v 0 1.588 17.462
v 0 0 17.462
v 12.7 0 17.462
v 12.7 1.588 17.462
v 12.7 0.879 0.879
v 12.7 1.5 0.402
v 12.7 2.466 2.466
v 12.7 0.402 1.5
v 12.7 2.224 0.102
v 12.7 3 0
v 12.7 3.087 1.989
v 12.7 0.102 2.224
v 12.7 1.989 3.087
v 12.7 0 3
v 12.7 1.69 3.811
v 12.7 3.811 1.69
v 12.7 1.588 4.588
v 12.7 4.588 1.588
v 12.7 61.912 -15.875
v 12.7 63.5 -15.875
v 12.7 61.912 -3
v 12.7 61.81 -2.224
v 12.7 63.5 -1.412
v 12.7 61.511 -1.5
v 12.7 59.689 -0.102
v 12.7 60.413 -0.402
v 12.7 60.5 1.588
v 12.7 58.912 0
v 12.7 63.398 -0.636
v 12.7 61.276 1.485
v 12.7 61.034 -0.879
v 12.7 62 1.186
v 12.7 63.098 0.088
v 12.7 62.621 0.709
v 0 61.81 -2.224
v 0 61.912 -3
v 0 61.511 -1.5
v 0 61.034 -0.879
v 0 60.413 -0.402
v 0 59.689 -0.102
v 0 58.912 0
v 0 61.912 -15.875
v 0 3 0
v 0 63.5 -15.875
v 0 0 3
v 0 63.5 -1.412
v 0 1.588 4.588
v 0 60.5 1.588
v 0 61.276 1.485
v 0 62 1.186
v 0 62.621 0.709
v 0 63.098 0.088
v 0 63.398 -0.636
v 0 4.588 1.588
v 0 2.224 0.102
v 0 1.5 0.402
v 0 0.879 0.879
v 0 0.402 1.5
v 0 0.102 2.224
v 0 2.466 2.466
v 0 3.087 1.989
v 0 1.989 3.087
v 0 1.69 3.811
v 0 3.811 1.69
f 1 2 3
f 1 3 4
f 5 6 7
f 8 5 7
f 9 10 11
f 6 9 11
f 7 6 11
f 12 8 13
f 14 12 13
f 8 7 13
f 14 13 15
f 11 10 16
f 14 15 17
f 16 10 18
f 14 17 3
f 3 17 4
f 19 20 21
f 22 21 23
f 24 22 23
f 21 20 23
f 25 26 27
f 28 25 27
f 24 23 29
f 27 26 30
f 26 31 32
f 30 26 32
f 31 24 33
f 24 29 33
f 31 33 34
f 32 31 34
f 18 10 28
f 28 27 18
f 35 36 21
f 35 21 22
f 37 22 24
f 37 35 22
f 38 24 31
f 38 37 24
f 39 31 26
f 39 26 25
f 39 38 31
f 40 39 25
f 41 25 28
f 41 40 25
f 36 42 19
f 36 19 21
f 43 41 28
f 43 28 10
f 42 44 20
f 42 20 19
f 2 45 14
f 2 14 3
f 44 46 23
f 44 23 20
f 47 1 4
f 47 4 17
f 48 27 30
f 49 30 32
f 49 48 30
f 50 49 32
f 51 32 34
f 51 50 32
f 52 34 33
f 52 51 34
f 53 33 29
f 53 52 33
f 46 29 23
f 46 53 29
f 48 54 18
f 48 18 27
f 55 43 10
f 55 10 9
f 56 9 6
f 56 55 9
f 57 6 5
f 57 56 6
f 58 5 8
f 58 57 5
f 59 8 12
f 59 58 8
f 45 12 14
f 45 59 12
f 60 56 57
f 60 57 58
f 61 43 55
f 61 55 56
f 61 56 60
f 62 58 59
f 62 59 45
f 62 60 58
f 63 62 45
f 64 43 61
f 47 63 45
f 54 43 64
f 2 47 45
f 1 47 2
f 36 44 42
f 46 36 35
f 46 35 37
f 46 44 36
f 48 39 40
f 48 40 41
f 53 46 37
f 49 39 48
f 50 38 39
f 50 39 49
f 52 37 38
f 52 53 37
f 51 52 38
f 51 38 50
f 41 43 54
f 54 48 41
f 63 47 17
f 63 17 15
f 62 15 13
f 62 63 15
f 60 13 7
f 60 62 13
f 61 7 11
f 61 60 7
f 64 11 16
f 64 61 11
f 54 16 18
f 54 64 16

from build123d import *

# Parameters (mm, degrees)
BOSS_EXTRUDE1_DEPTH = 12.7


with BuildPart() as part:
    # Sketch1 → Boss-Extrude1 (new body)
    with BuildSketch(Plane(origin=(0, 0, 0), x_dir=(0, 0, -1), z_dir=(1, 0, 0))):
        with BuildLine():
            Line((1.4125, 63.5), (15.875, 63.5))
            Line((15.875, 63.5), (15.875, 61.9125))
            Line((15.875, 61.9125), (3, 61.9125))
            ThreePointArc((3, 61.9125), (0.878679656, 61.033820344), (0, 58.9125))
            Line((0, 58.9125), (0, 3))
            ThreePointArc((0, 3), (-0.878679656, 0.878679656), (-3, 0))
            Line((-3, 0), (-17.4625, 0))
            Line((-17.4625, 0), (-17.4625, 1.5875))
            Line((-17.4625, 1.5875), (-4.5875, 1.5875))
            ThreePointArc((-4.5875, 1.5875), (-2.466179656, 2.466179656), (-1.5875, 4.5875))
            Line((-1.5875, 4.5875), (-1.5875, 60.5))
            ThreePointArc((-1.5875, 60.5), (-0.708820344, 62.621320344), (1.4125, 63.5))
        make_face()
    extrude(amount=BOSS_EXTRUDE1_DEPTH)


solid = part.part
